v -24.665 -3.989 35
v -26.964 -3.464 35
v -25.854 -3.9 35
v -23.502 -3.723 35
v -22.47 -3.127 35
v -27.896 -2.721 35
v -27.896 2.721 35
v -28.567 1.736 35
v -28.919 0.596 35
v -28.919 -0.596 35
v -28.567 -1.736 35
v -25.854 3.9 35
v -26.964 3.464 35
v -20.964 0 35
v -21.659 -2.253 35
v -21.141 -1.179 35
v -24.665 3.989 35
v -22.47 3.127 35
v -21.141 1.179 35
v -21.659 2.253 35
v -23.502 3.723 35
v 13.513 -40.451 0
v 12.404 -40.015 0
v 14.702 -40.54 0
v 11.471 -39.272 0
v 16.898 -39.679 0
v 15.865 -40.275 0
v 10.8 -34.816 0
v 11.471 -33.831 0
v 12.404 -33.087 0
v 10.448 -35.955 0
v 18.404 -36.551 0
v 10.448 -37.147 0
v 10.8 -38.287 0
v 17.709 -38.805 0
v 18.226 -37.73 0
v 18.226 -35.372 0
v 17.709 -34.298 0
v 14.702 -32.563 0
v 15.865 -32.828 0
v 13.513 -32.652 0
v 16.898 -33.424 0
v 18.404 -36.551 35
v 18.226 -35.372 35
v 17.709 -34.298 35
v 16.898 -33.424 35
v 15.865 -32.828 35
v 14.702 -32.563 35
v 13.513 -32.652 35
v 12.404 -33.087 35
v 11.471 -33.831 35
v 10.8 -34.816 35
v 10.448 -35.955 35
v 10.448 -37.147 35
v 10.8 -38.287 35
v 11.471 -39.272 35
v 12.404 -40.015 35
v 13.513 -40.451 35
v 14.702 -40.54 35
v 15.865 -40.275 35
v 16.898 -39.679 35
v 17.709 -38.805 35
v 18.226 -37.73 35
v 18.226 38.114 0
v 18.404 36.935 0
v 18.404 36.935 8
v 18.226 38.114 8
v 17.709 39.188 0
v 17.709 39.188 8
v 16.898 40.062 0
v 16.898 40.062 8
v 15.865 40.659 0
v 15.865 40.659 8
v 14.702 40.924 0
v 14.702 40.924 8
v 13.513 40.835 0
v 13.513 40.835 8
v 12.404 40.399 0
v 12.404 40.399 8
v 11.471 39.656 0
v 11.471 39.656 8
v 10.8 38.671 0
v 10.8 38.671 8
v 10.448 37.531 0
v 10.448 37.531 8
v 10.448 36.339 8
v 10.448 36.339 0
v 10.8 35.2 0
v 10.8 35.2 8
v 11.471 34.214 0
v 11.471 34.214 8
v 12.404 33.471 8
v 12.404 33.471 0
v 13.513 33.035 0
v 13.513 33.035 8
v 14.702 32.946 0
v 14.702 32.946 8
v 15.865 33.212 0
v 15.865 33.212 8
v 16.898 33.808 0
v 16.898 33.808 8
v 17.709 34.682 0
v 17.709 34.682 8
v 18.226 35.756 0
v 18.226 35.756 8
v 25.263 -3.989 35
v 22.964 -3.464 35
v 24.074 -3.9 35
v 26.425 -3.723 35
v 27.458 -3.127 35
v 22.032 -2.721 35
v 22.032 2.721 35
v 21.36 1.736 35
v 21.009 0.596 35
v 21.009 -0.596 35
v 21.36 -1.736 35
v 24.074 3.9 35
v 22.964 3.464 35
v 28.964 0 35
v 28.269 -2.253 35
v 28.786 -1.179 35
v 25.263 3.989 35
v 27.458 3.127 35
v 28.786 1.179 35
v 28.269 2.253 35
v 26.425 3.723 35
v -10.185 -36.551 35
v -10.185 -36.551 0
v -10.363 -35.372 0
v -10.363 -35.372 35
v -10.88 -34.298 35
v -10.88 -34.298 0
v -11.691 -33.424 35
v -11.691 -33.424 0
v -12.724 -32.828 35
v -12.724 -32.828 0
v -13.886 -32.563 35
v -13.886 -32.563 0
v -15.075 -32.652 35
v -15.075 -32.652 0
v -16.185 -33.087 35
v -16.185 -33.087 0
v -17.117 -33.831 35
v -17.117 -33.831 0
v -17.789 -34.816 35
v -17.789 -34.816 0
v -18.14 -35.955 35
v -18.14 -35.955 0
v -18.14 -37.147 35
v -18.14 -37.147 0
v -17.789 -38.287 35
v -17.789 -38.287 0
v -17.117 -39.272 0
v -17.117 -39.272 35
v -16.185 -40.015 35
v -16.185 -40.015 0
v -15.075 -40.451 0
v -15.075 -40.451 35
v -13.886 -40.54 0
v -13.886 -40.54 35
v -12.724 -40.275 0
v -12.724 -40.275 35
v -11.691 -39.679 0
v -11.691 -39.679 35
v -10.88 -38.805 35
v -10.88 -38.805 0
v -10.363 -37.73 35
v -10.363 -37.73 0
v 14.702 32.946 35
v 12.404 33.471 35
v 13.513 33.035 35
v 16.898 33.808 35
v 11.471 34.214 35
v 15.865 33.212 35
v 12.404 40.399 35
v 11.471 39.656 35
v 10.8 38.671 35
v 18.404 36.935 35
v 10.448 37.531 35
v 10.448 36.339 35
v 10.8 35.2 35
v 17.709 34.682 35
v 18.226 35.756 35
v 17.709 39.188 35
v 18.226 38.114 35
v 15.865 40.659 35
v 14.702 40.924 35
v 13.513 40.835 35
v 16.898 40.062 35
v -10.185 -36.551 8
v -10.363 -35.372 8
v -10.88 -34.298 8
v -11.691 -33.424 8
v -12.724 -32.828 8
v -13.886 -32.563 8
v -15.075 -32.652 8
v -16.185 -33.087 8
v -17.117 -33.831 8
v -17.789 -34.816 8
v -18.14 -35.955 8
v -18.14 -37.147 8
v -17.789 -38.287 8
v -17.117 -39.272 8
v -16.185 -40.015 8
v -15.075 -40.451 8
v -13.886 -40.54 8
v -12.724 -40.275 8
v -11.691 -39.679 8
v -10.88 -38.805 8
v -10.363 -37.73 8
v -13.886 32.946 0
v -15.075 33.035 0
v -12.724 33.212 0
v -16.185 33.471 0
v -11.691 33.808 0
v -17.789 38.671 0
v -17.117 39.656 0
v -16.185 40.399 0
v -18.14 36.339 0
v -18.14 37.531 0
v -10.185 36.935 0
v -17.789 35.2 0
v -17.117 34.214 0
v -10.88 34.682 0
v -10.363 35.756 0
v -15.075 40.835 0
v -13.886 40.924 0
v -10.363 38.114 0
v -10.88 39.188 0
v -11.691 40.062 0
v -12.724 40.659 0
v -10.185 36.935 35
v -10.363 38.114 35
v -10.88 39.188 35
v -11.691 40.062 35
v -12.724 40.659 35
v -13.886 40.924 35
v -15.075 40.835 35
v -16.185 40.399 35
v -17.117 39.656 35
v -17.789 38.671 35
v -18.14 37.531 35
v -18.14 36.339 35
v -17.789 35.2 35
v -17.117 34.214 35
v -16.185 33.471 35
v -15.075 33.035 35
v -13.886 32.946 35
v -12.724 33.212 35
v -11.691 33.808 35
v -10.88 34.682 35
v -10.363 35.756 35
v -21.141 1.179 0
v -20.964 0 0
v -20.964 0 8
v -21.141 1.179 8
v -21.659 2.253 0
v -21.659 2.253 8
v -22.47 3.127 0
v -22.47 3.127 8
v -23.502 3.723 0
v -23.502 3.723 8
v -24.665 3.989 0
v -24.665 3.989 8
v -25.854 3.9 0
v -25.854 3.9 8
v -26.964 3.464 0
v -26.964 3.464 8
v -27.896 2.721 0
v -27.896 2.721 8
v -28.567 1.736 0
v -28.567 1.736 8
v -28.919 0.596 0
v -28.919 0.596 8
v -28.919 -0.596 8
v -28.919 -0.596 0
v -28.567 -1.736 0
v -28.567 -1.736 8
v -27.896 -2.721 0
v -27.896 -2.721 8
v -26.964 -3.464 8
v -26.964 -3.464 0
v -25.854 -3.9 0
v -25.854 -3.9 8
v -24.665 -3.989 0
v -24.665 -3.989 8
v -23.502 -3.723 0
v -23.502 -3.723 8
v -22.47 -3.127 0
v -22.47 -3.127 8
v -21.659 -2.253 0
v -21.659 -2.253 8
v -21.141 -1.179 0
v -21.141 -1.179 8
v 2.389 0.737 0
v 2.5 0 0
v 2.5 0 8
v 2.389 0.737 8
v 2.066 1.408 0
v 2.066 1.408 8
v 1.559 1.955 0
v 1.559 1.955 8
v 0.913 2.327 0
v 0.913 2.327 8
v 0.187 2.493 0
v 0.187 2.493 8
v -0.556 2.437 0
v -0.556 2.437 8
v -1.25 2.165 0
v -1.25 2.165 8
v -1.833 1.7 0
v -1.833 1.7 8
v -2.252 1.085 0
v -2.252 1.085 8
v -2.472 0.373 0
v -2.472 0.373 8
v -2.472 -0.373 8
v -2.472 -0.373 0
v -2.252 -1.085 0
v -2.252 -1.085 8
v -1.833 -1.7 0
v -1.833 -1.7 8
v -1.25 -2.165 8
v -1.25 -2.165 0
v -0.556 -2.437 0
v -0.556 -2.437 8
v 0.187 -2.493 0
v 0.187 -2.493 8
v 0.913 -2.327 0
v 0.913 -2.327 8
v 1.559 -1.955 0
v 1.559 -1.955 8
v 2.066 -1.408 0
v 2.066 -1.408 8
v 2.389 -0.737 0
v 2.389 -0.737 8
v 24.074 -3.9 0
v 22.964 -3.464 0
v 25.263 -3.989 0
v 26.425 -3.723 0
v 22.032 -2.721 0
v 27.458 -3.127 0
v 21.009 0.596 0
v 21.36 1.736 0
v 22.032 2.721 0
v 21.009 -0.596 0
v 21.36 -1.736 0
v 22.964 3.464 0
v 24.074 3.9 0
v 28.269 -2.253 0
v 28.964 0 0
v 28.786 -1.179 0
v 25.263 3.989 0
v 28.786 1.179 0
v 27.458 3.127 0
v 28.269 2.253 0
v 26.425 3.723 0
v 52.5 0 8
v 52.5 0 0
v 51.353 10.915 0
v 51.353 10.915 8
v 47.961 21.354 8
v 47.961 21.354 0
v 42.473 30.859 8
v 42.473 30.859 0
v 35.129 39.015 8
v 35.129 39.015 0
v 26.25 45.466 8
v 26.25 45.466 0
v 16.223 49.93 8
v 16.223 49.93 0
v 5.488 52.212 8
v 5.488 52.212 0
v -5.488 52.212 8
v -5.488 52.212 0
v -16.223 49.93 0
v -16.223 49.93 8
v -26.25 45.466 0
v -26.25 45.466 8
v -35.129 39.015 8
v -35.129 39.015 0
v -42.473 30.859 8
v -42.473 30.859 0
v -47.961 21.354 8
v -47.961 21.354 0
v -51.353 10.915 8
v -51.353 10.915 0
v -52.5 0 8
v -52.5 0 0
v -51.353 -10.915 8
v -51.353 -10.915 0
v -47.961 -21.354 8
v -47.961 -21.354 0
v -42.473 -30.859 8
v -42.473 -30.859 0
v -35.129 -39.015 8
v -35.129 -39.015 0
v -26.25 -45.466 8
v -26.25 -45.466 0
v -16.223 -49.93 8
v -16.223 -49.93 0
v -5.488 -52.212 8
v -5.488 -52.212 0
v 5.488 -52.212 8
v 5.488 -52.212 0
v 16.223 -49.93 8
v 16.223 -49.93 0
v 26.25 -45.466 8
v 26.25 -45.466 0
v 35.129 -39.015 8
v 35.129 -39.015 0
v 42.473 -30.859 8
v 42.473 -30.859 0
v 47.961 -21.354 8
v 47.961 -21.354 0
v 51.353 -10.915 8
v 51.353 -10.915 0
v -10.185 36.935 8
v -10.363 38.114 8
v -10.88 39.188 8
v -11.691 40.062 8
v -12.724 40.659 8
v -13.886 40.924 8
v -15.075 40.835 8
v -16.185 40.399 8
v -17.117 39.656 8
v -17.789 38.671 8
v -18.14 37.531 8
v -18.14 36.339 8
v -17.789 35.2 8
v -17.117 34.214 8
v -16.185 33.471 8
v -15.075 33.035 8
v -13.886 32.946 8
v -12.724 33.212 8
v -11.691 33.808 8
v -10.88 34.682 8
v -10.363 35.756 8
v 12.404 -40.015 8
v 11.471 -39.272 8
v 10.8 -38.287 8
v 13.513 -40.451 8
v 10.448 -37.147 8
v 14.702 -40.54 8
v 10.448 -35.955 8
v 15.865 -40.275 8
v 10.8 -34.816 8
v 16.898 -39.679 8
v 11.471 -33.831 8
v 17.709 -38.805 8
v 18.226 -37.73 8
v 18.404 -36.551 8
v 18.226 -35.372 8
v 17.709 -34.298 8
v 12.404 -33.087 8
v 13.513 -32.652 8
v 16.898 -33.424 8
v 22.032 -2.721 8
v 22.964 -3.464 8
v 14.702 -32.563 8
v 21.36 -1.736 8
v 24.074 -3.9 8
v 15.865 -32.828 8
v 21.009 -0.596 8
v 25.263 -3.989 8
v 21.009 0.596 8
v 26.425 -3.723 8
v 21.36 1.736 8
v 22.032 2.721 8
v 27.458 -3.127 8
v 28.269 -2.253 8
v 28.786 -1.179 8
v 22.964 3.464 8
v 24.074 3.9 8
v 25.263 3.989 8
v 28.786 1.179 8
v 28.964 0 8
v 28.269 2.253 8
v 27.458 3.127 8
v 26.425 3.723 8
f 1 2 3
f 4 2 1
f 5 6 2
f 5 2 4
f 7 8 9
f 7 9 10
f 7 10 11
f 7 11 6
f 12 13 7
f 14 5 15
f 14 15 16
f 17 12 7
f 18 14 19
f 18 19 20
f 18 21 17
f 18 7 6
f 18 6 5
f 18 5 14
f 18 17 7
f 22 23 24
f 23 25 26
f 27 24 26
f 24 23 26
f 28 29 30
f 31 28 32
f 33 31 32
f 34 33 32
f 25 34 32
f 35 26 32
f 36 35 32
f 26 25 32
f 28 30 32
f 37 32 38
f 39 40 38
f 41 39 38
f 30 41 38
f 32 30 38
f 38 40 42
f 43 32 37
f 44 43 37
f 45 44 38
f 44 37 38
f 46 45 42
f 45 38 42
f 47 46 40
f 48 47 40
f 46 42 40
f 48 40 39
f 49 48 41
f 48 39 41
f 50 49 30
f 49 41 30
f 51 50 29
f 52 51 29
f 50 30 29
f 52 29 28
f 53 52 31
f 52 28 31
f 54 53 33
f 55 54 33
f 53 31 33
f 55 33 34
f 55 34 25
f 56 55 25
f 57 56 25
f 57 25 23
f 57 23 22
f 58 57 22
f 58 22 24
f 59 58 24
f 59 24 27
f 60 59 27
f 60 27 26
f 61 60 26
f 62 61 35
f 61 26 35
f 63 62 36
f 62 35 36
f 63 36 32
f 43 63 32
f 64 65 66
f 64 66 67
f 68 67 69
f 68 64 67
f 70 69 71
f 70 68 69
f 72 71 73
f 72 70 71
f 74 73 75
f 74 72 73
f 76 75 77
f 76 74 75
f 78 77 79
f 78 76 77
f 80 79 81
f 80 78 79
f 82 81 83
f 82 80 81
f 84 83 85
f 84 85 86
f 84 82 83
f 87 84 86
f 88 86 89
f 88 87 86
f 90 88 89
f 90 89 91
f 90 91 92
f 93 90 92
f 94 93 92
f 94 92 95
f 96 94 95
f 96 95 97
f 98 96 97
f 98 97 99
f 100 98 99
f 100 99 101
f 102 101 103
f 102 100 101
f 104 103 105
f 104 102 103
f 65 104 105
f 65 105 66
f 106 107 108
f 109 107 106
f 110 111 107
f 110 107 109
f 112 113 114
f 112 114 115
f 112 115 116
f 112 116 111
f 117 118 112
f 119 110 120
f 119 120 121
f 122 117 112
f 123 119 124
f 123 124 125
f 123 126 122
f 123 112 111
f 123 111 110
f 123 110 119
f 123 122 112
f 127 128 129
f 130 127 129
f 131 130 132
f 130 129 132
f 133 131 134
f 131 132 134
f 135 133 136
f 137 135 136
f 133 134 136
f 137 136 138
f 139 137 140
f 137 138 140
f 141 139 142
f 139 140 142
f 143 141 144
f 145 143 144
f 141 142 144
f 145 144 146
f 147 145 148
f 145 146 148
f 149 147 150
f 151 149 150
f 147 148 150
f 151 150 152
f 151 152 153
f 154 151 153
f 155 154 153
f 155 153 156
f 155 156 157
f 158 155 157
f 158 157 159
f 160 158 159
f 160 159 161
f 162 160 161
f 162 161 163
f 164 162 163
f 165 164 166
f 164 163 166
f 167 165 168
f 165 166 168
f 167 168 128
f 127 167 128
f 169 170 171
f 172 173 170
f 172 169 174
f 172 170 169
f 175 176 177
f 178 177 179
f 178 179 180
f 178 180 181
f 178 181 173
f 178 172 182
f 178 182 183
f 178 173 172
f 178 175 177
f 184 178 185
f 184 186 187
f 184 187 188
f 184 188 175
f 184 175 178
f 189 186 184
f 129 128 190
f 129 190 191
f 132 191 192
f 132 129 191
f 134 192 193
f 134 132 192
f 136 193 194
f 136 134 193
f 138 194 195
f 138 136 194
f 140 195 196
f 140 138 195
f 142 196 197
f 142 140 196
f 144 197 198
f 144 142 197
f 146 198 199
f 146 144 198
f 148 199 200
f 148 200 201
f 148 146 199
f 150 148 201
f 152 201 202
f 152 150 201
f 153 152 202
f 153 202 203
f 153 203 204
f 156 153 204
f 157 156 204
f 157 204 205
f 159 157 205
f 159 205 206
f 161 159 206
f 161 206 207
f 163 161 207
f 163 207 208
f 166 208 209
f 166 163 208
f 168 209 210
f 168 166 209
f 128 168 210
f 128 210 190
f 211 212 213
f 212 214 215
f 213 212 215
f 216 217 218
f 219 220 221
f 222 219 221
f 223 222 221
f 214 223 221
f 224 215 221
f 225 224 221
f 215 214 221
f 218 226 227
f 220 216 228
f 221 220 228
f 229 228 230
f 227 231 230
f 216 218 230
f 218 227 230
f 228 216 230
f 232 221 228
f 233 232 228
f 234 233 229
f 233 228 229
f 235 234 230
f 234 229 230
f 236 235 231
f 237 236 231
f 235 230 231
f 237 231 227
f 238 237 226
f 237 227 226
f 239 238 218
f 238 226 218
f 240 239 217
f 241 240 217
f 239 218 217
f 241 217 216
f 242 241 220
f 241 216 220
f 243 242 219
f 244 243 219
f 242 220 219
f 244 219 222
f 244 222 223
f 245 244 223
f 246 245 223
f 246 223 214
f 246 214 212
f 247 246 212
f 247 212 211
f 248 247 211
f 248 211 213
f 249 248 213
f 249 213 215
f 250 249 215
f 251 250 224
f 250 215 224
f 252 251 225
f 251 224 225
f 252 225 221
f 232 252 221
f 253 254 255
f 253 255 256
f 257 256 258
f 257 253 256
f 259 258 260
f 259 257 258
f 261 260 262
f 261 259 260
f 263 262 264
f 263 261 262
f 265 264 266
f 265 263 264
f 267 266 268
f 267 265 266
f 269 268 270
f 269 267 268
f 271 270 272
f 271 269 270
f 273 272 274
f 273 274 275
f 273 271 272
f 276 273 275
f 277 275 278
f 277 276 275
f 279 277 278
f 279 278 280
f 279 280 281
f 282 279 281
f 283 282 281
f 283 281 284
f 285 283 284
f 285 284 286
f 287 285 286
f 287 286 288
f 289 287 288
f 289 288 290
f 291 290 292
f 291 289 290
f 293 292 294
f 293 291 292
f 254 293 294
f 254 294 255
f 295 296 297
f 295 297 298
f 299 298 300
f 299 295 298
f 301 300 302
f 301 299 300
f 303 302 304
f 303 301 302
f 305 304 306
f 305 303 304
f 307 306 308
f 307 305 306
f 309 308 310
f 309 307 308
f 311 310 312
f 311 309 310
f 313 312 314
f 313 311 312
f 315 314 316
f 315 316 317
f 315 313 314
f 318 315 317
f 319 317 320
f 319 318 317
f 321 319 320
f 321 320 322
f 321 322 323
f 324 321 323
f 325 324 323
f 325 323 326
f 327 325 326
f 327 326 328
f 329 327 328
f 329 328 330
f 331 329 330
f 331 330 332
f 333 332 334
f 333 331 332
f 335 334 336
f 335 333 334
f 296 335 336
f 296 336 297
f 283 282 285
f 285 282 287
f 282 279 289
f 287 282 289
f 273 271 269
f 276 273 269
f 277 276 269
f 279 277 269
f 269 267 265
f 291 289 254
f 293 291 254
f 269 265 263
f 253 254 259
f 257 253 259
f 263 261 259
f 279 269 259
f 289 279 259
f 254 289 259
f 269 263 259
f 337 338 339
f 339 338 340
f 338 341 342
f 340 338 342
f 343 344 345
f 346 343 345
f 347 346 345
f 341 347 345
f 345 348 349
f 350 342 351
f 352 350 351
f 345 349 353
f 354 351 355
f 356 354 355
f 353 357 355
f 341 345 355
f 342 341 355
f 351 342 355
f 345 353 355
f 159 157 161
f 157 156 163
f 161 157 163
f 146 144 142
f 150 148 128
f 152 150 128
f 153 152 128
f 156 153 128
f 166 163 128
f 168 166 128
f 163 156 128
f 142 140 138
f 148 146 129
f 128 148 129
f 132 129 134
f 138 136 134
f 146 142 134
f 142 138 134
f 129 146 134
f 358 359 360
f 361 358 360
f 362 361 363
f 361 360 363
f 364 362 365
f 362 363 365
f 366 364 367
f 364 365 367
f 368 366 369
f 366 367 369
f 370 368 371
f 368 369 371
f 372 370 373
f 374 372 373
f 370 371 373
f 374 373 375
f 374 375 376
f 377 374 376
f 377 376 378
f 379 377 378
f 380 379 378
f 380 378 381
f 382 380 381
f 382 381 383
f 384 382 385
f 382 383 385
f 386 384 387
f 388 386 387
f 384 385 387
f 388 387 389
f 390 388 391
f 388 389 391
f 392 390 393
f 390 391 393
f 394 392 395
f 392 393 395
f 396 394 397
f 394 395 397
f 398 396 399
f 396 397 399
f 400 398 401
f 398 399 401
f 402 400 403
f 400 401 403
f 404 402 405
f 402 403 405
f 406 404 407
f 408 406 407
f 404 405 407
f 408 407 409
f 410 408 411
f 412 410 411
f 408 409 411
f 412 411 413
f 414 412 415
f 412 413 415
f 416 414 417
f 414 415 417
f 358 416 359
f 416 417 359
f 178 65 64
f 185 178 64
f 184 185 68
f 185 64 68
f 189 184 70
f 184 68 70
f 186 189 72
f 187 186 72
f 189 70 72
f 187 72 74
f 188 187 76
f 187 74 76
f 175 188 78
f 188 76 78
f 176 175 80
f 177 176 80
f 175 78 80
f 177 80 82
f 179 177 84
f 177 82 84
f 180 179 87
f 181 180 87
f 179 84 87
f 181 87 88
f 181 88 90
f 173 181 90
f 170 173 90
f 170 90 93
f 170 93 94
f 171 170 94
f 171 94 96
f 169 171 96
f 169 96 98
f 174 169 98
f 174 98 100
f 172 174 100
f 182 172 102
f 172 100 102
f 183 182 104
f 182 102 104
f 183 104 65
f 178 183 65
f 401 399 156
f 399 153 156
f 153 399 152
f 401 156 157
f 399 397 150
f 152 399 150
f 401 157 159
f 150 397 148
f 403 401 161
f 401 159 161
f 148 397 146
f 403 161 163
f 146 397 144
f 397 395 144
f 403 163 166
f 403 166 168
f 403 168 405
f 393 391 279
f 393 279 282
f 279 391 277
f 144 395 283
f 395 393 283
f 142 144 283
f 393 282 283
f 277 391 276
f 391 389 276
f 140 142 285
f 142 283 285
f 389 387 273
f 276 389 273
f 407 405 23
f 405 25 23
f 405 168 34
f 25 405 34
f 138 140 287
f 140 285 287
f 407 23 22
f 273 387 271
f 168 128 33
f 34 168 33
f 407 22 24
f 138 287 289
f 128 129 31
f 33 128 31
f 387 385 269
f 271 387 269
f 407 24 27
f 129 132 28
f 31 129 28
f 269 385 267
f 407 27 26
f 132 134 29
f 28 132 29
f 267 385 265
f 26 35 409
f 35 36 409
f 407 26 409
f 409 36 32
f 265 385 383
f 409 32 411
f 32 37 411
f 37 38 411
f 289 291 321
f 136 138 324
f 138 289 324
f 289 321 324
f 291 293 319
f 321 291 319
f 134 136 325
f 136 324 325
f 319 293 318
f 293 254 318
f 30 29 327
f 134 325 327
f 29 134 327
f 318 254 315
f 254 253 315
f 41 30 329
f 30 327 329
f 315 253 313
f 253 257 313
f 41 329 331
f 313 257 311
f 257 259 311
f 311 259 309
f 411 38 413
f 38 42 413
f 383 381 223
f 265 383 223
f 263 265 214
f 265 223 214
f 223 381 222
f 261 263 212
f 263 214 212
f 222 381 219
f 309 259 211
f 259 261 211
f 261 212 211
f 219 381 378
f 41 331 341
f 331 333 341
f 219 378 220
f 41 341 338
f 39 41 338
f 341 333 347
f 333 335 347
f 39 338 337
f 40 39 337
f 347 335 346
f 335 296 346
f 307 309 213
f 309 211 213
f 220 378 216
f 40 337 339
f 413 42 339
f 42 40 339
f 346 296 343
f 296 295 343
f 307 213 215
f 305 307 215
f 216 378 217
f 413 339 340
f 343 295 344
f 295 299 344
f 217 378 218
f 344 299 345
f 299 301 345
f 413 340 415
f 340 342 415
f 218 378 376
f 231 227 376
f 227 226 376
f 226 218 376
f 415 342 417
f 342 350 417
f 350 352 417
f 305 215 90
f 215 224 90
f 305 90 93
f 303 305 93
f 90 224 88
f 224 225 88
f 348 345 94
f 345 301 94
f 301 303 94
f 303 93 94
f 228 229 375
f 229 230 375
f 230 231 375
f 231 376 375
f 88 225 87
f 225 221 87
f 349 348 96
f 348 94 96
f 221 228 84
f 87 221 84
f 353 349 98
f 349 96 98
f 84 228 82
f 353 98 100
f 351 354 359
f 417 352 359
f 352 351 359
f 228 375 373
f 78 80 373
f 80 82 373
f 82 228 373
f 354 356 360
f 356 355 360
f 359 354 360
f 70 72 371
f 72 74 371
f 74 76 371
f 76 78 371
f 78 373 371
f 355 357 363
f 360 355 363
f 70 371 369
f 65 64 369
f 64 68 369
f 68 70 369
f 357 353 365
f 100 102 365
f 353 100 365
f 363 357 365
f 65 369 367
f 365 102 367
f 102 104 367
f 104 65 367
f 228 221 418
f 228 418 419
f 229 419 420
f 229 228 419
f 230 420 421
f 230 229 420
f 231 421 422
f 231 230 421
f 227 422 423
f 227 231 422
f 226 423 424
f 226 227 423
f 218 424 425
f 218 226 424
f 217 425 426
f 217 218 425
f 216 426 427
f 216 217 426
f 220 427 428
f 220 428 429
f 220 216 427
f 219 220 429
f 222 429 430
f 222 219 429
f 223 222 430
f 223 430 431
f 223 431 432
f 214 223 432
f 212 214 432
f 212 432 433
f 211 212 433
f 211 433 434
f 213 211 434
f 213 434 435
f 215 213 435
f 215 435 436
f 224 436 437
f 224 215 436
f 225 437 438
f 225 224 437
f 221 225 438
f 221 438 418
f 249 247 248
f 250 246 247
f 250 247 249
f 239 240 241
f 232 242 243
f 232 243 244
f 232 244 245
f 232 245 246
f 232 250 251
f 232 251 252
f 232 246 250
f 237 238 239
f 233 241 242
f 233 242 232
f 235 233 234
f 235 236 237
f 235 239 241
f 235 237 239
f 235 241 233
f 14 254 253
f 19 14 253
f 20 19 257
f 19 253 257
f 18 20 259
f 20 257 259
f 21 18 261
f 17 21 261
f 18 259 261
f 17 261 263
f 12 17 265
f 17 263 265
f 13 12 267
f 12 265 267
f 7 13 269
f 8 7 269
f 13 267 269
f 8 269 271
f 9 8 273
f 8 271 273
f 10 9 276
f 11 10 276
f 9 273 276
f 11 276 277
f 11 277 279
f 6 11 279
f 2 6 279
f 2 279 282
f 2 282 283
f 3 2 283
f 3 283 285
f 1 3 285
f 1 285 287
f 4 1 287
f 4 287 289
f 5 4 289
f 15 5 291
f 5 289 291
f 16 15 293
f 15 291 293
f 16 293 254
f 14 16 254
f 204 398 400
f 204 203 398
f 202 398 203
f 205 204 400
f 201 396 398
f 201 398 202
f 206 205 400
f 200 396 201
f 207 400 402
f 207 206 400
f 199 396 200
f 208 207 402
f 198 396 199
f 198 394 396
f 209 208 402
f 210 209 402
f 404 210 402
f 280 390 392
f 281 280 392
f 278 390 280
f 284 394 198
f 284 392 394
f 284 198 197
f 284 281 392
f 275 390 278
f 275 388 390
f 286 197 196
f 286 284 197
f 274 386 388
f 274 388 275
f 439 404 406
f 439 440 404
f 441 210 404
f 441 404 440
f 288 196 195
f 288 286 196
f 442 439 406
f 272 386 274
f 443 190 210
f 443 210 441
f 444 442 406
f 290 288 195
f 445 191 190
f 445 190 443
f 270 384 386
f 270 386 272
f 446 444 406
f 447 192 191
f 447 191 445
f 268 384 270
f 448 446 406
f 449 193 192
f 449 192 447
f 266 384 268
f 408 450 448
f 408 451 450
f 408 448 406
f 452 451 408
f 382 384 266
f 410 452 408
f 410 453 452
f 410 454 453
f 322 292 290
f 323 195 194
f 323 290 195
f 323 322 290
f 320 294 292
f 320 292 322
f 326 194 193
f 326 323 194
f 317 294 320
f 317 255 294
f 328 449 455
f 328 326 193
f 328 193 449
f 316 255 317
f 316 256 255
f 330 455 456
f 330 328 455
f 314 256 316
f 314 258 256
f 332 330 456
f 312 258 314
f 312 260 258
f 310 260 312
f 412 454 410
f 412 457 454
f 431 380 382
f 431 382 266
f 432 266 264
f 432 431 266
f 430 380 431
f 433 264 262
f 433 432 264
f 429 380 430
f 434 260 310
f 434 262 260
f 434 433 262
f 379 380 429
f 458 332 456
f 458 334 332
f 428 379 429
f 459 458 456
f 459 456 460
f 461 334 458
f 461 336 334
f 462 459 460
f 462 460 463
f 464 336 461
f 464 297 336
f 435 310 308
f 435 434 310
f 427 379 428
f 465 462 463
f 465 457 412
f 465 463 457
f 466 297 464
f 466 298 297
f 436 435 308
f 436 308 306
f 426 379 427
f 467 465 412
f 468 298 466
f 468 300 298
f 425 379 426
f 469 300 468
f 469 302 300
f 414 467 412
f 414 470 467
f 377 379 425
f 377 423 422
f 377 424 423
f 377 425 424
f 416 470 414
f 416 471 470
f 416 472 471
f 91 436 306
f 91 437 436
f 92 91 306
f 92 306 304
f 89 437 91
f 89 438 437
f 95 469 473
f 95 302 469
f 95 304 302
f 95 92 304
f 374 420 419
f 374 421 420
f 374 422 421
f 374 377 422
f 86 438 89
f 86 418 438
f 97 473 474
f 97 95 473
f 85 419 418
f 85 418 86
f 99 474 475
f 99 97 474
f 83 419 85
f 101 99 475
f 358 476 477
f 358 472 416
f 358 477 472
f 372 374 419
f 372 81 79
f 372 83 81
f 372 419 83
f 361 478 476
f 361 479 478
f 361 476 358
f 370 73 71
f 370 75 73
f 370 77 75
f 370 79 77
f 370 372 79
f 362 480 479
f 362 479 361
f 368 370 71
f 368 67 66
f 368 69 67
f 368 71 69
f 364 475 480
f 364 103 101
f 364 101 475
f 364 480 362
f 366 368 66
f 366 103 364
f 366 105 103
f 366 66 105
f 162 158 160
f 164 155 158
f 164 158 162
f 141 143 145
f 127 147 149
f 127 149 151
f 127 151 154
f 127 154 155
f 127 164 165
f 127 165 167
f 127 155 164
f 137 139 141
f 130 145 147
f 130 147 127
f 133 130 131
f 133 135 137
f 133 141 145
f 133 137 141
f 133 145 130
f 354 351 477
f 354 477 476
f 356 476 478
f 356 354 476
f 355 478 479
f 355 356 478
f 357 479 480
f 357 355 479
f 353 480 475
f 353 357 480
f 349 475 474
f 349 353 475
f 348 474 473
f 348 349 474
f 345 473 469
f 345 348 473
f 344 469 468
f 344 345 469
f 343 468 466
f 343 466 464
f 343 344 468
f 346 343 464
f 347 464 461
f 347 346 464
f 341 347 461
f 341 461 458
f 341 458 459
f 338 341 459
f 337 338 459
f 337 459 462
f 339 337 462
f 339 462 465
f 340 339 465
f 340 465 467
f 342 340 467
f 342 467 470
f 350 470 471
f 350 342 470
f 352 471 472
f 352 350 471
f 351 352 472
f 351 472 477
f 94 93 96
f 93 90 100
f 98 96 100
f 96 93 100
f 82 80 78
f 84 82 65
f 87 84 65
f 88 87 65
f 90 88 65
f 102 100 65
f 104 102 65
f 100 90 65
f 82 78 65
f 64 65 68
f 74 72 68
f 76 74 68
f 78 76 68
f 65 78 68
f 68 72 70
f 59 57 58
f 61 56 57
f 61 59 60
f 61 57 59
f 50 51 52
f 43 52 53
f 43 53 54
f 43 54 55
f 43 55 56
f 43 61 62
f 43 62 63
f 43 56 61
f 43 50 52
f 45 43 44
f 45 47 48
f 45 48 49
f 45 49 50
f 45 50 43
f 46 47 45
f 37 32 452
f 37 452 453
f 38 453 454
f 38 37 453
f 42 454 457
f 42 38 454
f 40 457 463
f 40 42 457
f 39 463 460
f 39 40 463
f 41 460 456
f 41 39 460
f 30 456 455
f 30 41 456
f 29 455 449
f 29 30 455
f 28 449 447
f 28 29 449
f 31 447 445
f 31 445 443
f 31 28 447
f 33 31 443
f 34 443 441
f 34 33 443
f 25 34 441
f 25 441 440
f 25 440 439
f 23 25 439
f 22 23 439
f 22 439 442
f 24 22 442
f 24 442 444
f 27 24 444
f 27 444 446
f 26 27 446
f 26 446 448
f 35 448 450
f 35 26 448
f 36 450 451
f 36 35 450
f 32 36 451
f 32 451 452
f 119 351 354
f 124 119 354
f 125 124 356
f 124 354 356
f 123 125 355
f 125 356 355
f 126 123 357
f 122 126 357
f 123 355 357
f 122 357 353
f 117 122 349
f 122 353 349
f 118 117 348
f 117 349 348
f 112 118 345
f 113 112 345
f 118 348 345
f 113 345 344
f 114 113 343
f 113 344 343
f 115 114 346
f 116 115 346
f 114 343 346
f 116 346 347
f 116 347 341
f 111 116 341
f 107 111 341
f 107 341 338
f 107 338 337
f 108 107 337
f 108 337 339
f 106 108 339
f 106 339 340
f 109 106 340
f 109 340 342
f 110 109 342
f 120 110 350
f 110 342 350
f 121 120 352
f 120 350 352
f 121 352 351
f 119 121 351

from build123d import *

# Parameters (mm, degrees)
F0_R     = 4
F1_DEPTH = 34.99993
F0_R_2   = 52.499997
F0_R_3   = 2.499995
F2_DEPTH = 8


with BuildPart() as f1:
    # F0 (on Top) → F1 (new body)
    with BuildSketch(Plane.XY):
        with Locations((-24.963507, 0)):
            Circle(F0_R)
        with Locations((-14.185139, -36.55133)):
            Circle(F0_R)
        with Locations((14.403568, -36.55133)):
            Circle(F0_R)
        with Locations((24.964135, 0)):
            Circle(F0_R)
        with Locations((14.403568, 36.935072)):
            Circle(F0_R)
        with Locations((-14.185139, 36.935072)):
            Circle(F0_R)
    extrude(amount=F1_DEPTH)


with BuildPart() as f2:
    # F0 (on Top) → F2 (new body)
    with BuildSketch(Plane.XY):
        Circle(F0_R_2)
        with Locations((-14.185139, -36.55133)):
            Circle(F0_R, mode=Mode.SUBTRACT)
        with Locations((14.403568, -36.55133)):
            Circle(F0_R, mode=Mode.SUBTRACT)
        with Locations((-24.963507, 0)):
            Circle(F0_R, mode=Mode.SUBTRACT)
        with Locations((-14.185139, 36.935072)):
            Circle(F0_R, mode=Mode.SUBTRACT)
        Circle(F0_R_3, mode=Mode.SUBTRACT)
        with Locations((24.964135, 0)):
            Circle(F0_R, mode=Mode.SUBTRACT)
        with Locations((14.403568, 36.935072)):
            Circle(F0_R, mode=Mode.SUBTRACT)
    extrude(amount=F2_DEPTH)


solid = Compound([f1.part, f2.part])
